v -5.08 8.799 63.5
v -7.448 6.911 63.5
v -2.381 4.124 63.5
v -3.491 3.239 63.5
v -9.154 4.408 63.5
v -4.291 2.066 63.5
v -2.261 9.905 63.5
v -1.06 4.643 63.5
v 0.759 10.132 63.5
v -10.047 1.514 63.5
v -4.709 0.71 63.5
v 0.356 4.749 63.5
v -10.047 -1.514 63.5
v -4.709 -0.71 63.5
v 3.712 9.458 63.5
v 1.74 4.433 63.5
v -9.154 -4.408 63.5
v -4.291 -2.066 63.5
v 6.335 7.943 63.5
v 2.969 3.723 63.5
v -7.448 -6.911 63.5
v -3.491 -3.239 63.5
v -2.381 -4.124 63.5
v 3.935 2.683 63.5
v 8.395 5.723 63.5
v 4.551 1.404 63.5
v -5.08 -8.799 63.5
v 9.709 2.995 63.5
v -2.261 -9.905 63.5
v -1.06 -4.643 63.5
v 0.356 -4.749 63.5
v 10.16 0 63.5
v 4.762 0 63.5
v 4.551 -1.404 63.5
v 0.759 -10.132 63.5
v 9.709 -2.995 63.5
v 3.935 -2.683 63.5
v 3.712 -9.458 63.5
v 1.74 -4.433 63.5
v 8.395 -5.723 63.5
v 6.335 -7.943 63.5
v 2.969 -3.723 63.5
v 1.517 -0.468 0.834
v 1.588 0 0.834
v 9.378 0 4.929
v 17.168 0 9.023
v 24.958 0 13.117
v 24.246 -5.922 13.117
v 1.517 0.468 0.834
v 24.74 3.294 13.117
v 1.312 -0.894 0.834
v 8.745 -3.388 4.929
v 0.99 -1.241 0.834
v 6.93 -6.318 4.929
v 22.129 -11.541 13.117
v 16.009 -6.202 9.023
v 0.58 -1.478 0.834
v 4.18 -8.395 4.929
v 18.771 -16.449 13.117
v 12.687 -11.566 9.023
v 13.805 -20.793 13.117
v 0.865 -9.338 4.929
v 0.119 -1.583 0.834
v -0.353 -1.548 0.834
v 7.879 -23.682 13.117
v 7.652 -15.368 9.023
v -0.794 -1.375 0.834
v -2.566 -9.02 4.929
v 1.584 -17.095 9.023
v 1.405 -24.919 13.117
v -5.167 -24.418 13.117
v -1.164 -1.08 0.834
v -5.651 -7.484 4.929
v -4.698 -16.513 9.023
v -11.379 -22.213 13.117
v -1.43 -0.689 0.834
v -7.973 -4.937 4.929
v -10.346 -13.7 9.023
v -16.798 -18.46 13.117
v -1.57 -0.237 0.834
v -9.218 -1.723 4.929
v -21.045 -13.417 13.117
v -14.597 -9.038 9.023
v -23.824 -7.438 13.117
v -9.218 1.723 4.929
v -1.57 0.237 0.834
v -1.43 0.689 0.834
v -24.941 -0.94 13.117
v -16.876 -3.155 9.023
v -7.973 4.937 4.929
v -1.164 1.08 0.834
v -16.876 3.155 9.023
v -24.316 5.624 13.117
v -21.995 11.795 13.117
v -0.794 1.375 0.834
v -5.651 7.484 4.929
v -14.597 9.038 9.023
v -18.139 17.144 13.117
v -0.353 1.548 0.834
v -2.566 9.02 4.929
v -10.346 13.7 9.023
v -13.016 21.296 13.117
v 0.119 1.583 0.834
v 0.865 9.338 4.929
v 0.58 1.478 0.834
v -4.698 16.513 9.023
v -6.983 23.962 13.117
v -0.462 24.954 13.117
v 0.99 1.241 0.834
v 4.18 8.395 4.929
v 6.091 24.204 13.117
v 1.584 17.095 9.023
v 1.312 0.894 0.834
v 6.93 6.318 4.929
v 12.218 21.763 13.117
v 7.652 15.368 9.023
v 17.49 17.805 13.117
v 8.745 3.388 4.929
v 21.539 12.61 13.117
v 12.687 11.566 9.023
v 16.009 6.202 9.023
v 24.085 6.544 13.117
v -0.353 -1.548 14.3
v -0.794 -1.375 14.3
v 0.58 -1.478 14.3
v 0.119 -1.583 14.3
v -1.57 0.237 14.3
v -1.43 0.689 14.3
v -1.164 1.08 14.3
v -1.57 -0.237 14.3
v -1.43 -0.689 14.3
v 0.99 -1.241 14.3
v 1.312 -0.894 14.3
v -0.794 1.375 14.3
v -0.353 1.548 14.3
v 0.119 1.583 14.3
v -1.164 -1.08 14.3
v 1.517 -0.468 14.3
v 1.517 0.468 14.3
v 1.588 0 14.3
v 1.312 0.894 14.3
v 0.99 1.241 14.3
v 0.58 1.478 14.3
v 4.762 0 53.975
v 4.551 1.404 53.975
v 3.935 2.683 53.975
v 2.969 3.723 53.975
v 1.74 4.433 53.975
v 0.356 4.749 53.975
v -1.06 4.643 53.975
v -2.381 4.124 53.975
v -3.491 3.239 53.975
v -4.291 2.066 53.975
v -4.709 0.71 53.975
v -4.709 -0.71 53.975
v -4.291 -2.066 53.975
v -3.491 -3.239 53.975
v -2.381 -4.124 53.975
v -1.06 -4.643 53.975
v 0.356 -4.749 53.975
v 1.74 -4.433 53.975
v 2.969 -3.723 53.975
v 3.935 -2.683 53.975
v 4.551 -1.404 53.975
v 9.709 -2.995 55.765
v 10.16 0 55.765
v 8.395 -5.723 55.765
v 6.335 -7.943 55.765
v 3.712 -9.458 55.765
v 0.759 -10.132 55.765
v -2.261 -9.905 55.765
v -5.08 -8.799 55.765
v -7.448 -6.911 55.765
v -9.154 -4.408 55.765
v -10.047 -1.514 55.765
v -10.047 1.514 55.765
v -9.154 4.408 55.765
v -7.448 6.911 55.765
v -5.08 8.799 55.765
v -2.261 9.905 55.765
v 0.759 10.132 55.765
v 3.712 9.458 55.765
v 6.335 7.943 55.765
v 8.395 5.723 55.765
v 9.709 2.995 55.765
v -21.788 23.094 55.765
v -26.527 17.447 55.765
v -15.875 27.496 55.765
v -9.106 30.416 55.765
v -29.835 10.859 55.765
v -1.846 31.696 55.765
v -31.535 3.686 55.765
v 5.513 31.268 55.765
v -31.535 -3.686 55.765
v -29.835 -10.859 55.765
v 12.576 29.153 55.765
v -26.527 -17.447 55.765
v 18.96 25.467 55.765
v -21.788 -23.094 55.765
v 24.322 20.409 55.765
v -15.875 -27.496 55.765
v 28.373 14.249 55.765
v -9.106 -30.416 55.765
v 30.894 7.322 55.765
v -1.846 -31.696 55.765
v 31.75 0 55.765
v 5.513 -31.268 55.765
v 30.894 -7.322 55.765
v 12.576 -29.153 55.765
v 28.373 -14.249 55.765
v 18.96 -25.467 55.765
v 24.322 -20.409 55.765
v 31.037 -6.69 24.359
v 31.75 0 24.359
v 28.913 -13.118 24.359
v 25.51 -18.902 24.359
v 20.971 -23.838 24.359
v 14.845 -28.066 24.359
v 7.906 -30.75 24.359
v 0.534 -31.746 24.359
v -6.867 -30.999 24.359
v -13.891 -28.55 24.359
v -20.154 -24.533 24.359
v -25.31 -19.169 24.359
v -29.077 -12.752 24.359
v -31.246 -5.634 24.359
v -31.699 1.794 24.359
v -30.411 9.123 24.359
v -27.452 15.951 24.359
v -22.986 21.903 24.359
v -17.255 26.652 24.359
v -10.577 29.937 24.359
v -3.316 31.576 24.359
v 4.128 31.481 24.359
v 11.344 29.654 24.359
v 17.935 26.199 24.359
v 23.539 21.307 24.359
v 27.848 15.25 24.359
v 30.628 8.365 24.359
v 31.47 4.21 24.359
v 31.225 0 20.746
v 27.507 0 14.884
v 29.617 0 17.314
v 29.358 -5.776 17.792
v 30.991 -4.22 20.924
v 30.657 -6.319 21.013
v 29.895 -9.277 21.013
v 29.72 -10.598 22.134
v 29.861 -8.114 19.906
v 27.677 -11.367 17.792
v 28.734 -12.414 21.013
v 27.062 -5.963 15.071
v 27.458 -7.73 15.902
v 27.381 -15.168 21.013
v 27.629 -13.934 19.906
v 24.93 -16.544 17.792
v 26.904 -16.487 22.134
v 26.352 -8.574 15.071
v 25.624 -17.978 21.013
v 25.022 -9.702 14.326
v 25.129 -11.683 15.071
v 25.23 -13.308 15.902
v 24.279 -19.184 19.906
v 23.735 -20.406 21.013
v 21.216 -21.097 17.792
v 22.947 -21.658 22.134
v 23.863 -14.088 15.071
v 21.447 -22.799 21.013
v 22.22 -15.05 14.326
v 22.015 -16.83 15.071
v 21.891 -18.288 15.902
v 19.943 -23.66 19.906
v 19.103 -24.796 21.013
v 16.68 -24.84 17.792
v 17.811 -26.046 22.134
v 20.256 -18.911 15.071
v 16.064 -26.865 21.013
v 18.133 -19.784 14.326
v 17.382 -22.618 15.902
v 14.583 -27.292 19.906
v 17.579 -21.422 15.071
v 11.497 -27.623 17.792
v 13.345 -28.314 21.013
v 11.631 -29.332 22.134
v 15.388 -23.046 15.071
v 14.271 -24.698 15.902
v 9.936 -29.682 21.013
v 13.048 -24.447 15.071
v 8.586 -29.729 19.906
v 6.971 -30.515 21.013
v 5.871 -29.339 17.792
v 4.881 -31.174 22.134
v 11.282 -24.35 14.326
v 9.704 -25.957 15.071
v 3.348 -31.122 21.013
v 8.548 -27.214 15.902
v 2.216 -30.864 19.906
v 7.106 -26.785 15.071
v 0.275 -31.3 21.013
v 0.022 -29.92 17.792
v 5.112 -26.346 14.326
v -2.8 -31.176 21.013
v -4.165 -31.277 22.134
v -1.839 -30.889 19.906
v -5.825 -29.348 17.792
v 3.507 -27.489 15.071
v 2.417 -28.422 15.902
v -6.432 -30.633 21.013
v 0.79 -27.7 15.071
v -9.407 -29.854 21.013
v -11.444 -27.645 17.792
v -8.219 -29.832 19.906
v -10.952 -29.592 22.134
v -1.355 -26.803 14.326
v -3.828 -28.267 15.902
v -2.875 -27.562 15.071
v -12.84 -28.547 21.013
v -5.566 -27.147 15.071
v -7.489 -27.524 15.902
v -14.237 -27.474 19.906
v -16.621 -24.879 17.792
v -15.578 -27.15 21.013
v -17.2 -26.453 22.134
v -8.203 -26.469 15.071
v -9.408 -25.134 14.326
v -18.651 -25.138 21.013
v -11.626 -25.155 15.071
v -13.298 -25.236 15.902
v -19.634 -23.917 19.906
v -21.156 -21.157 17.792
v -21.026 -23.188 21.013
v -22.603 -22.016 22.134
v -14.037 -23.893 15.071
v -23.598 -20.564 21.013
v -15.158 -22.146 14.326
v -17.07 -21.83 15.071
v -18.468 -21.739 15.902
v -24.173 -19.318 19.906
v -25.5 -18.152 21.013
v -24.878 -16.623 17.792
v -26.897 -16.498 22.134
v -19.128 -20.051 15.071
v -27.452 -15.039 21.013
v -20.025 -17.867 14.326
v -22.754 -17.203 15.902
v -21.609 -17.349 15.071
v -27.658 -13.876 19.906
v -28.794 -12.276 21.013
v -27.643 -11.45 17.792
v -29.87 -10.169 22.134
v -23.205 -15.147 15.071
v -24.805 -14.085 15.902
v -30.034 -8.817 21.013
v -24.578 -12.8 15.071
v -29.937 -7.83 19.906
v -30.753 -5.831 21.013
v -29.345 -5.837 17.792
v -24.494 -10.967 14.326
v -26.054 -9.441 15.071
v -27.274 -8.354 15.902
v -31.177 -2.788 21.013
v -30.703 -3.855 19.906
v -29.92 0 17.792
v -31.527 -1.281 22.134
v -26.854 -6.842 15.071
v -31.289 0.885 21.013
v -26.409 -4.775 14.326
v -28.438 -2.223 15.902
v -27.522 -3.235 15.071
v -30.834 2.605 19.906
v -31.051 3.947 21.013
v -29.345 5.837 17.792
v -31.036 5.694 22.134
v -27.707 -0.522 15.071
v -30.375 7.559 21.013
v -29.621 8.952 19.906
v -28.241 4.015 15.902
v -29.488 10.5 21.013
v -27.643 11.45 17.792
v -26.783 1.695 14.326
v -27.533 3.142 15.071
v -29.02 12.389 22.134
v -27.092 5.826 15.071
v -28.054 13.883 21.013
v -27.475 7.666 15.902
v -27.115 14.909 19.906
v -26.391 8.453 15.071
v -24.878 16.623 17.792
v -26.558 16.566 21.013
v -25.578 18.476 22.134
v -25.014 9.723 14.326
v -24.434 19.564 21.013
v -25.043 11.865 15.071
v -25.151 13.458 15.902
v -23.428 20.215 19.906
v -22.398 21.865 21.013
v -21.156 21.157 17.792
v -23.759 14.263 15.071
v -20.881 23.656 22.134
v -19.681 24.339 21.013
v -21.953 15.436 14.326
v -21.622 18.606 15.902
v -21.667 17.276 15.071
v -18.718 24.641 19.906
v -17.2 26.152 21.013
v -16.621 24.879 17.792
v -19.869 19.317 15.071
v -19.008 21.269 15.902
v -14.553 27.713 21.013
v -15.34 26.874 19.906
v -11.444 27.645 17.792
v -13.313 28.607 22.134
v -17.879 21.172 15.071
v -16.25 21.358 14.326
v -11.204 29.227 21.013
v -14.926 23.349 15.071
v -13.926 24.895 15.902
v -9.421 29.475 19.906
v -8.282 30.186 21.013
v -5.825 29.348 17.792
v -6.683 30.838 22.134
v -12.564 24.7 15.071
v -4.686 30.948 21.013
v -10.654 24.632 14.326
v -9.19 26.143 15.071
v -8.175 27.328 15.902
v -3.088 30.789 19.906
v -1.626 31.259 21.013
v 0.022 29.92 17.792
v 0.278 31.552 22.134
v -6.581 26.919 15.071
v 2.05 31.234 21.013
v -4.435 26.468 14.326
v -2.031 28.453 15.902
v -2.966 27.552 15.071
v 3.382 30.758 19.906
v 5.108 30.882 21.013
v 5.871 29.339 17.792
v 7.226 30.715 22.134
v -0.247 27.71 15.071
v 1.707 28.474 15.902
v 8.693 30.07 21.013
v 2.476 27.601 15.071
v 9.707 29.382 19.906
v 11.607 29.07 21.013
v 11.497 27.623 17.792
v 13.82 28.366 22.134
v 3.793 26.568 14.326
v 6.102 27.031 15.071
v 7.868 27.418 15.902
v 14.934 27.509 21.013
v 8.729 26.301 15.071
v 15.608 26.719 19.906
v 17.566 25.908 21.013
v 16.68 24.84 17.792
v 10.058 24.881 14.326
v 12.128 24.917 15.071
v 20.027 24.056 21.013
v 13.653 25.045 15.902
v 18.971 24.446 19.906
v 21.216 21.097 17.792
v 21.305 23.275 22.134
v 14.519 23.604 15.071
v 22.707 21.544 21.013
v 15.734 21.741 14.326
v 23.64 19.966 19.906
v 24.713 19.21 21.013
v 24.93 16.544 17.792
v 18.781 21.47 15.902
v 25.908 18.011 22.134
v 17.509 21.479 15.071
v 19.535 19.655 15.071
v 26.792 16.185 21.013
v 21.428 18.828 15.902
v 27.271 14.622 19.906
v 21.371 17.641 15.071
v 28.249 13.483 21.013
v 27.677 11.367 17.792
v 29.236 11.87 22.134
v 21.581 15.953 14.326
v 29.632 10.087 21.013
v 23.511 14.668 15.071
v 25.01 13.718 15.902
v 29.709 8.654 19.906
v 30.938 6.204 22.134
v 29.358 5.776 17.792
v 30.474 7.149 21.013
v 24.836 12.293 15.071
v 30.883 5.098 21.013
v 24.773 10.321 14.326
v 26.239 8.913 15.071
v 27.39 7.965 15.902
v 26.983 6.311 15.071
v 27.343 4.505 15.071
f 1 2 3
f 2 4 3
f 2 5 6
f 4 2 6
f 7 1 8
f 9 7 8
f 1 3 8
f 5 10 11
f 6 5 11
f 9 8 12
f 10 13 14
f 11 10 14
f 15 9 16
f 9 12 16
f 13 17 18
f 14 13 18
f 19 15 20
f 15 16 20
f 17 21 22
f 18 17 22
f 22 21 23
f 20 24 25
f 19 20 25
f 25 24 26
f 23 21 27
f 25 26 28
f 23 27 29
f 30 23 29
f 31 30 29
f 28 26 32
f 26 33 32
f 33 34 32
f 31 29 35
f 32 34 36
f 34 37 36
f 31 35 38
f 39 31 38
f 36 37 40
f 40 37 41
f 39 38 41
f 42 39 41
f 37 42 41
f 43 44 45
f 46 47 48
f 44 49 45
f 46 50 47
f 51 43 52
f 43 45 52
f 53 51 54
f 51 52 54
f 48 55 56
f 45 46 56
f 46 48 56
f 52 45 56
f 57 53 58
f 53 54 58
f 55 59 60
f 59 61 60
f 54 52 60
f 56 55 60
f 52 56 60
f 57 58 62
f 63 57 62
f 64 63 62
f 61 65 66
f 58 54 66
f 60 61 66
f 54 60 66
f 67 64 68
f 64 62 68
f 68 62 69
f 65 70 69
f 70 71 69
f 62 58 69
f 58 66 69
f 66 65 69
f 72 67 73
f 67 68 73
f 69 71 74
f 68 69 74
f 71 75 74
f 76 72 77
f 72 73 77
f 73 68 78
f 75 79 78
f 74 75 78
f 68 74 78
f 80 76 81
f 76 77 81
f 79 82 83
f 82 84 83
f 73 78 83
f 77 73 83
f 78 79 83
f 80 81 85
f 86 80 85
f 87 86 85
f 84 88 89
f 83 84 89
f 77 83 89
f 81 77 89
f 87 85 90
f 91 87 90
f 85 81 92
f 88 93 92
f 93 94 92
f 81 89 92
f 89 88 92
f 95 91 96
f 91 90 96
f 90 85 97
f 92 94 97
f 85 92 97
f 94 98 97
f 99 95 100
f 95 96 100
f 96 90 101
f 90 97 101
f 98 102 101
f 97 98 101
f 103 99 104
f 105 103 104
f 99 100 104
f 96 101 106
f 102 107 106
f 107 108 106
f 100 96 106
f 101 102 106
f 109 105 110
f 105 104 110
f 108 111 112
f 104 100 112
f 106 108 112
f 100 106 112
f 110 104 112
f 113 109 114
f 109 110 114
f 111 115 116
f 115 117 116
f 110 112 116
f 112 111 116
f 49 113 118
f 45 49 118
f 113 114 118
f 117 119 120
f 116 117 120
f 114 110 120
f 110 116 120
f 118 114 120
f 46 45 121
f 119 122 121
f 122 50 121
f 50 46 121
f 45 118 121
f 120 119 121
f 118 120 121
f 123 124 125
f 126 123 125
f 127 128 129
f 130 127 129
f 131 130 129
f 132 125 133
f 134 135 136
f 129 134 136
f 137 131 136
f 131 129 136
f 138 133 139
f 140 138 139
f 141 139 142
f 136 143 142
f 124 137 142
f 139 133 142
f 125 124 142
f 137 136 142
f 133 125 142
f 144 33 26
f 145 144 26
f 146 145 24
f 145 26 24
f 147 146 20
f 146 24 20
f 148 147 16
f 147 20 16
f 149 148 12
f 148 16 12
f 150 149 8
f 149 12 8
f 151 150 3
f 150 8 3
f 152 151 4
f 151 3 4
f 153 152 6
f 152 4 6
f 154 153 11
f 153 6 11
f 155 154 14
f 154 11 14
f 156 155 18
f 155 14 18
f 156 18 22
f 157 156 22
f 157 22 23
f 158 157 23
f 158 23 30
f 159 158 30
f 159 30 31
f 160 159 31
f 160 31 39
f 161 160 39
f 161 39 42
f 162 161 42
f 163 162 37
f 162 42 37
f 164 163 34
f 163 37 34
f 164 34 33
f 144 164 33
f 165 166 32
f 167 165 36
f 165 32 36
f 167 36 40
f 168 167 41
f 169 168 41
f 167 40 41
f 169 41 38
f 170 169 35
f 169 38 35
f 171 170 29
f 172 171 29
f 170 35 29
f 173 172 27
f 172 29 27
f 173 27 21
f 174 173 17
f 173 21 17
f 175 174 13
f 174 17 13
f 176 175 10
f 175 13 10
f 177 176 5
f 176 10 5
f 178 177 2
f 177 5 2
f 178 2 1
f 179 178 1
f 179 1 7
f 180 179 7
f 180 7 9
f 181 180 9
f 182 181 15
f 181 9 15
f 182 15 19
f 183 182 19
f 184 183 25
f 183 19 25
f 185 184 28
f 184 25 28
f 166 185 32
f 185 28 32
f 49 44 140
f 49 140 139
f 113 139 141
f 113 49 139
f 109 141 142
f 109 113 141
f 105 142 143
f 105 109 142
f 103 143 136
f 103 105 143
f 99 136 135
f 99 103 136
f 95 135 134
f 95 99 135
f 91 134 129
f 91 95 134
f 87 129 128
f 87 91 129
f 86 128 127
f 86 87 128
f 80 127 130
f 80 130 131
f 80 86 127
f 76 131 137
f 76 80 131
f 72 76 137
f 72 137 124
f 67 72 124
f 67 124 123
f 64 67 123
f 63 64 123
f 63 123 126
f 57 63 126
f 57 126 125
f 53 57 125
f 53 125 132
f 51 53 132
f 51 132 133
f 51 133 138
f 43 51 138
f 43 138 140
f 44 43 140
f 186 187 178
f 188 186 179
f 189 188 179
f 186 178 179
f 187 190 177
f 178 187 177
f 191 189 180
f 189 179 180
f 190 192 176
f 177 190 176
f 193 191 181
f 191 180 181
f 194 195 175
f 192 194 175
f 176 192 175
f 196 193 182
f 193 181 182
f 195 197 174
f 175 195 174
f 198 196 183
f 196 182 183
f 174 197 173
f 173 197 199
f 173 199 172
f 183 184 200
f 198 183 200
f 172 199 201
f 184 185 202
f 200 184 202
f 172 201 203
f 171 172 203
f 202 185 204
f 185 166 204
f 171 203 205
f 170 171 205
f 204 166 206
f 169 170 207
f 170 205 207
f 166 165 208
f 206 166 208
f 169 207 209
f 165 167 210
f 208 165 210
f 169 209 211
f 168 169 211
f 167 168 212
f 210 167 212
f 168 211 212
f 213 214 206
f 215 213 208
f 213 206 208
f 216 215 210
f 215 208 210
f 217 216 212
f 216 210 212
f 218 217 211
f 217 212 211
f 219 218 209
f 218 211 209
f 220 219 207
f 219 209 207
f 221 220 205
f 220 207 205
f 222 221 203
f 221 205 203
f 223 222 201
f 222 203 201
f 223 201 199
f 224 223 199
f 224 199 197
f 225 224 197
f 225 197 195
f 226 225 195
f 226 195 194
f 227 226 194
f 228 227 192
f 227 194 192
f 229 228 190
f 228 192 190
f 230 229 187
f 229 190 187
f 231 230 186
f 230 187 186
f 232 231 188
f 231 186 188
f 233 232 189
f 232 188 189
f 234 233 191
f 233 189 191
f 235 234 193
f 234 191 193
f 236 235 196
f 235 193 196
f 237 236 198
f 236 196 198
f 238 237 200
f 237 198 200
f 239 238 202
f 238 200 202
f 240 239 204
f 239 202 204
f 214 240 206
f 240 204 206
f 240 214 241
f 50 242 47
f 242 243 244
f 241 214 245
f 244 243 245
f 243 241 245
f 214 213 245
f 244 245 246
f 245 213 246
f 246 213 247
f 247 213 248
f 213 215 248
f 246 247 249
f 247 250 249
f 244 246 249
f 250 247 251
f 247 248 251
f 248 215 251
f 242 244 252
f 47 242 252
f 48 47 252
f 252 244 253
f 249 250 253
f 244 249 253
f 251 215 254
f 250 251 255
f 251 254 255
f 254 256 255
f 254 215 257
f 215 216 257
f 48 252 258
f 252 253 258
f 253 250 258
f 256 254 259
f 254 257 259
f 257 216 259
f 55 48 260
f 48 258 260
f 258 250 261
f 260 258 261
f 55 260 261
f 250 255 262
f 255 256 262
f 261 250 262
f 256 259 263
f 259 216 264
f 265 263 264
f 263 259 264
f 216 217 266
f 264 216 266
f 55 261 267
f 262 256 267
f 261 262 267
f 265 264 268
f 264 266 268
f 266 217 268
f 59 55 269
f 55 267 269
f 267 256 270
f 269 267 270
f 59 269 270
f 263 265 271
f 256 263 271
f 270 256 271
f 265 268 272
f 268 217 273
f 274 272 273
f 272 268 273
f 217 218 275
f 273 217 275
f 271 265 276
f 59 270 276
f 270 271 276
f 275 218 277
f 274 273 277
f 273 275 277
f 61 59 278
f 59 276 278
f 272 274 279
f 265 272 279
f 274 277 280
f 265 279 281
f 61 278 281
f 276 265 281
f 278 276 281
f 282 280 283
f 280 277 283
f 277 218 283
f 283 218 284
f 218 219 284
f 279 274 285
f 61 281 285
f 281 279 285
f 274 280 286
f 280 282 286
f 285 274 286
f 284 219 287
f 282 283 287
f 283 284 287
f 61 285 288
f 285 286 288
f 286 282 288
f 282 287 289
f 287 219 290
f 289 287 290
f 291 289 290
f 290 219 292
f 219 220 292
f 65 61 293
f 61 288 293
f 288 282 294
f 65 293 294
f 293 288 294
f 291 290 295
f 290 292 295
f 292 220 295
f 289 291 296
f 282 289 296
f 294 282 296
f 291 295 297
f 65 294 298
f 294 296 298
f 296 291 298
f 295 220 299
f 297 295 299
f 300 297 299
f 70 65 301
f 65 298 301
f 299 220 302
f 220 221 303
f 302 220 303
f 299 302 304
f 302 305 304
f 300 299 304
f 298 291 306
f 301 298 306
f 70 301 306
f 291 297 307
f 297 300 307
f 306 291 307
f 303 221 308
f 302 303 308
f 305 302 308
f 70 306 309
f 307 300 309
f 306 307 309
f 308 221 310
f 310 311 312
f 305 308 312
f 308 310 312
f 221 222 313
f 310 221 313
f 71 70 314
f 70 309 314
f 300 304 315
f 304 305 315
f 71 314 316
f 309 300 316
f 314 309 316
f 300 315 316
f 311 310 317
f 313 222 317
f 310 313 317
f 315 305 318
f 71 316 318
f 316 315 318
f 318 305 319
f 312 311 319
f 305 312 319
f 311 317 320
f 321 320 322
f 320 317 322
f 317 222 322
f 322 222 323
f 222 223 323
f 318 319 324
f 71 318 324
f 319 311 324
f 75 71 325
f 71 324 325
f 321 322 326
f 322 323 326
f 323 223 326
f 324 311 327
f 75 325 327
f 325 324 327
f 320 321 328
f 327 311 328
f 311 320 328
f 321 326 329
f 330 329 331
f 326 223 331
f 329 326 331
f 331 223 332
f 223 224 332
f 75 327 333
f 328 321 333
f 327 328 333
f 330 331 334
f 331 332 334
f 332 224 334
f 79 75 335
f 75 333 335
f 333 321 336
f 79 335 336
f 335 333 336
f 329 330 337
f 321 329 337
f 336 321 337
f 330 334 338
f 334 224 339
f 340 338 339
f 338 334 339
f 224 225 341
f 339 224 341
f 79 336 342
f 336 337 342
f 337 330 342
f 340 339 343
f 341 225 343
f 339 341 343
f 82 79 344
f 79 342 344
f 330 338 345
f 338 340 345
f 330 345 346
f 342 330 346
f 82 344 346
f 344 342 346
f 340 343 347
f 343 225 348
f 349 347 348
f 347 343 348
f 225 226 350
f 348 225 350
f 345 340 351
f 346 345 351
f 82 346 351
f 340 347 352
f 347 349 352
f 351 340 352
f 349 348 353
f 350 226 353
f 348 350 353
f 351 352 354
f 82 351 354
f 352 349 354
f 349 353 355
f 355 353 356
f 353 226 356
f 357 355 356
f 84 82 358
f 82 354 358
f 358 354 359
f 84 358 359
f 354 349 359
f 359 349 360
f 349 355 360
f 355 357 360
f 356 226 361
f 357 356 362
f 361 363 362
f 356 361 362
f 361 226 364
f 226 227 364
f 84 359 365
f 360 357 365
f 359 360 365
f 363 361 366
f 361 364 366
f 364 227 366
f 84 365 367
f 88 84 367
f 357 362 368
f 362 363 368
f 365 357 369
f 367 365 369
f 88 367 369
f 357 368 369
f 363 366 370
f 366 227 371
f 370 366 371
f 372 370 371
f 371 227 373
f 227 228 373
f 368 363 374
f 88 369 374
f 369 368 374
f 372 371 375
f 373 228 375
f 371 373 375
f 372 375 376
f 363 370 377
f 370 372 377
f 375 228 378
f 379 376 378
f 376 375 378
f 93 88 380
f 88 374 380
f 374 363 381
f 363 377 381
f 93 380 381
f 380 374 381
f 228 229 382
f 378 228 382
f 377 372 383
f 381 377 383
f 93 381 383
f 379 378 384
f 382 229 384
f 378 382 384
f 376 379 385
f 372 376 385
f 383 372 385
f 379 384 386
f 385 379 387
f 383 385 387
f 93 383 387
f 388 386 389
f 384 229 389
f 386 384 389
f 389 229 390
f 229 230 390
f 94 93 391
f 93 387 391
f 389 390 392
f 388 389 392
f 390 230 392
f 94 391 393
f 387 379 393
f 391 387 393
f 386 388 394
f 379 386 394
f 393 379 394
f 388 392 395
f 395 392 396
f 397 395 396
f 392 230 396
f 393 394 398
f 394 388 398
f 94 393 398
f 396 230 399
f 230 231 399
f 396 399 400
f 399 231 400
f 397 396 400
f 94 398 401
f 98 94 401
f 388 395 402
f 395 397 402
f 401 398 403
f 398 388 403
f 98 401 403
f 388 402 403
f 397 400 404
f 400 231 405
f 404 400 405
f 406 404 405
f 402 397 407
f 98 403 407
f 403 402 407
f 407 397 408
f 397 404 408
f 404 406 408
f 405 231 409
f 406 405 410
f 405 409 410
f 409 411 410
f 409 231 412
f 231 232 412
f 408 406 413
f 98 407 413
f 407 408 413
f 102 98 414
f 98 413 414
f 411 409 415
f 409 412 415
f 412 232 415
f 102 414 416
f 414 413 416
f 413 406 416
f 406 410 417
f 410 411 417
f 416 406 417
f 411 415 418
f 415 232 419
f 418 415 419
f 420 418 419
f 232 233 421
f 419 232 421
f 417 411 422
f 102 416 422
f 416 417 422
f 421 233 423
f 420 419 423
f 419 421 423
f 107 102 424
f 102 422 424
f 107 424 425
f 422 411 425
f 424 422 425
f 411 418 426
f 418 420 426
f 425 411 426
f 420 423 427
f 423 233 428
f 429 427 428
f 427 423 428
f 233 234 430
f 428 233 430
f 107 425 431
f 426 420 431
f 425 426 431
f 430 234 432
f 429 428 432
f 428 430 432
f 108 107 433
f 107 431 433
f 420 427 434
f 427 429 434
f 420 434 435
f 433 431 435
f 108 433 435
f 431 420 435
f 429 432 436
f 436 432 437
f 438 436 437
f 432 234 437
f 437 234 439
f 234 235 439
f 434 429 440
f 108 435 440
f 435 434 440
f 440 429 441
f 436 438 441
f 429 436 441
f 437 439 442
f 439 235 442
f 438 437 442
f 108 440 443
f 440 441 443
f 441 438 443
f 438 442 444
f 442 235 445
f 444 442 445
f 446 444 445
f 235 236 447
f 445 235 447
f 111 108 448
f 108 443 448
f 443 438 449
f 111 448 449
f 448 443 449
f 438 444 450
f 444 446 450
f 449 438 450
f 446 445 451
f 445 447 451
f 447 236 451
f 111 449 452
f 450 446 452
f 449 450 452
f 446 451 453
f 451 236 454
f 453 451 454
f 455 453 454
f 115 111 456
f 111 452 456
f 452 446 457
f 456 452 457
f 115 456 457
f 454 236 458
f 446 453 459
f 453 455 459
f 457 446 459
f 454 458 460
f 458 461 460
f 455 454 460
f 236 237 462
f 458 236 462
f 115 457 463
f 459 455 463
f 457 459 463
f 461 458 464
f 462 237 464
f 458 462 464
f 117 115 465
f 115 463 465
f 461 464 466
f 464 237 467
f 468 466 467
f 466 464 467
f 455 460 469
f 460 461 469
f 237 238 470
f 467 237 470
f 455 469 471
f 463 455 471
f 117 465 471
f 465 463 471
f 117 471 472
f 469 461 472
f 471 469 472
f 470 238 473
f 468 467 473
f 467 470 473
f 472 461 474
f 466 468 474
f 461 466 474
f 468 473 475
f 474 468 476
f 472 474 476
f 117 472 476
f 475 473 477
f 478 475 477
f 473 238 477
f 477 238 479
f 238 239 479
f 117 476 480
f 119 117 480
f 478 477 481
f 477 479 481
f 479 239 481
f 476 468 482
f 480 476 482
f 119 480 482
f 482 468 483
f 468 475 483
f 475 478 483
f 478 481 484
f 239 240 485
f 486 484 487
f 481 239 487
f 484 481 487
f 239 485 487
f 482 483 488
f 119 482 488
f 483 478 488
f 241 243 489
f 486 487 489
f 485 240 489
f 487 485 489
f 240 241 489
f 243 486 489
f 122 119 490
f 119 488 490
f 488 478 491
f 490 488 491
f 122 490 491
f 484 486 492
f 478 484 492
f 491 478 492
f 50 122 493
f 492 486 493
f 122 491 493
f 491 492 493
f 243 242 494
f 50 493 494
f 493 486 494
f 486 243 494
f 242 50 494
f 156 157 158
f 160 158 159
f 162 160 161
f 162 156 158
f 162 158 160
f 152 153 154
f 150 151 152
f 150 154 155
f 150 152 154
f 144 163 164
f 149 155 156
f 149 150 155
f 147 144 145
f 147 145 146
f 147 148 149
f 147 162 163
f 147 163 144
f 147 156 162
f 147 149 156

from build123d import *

# Parameters (mm, degrees)
F2_R     = 4.7625
F3_DEPTH = 9.525
F5_R     = 12.7
F4_R     = 1.5875
F6_DEPTH = 14.3002


with BuildPart() as f1:
    # F0 (on Front) → F1 (revolve)
    with BuildSketch(Plane.XZ):
        Polygon((10.16, 55.764545), (10.16, 63.5), (0, 63.5), (0, 0), (31.75, 16.686577), (31.75, 28.86522), (31.75, 46.204952), (31.75, 55.764545), align=None)
    revolve(axis=Axis((0, 0, 31.75), (0, 0, -1)))

    # F2 (on face) → F3 (cut)
    with BuildSketch(Plane.XY.offset(63.5)):
        Circle(F2_R)
    extrude(amount=-F3_DEPTH, mode=Mode.SUBTRACT)

    # F5
    f5_edges = [f1.edges().sort_by_distance(p)[0] for p in [
        (-31.75, 0, 16.686577),
    ]]
    fillet(f5_edges, radius=F5_R)

    # F4 (on Top) → F6 (cut)
    with BuildSketch(Plane.XY):
        Circle(F4_R)
    extrude(amount=F6_DEPTH, mode=Mode.SUBTRACT)


solid = f1.part
